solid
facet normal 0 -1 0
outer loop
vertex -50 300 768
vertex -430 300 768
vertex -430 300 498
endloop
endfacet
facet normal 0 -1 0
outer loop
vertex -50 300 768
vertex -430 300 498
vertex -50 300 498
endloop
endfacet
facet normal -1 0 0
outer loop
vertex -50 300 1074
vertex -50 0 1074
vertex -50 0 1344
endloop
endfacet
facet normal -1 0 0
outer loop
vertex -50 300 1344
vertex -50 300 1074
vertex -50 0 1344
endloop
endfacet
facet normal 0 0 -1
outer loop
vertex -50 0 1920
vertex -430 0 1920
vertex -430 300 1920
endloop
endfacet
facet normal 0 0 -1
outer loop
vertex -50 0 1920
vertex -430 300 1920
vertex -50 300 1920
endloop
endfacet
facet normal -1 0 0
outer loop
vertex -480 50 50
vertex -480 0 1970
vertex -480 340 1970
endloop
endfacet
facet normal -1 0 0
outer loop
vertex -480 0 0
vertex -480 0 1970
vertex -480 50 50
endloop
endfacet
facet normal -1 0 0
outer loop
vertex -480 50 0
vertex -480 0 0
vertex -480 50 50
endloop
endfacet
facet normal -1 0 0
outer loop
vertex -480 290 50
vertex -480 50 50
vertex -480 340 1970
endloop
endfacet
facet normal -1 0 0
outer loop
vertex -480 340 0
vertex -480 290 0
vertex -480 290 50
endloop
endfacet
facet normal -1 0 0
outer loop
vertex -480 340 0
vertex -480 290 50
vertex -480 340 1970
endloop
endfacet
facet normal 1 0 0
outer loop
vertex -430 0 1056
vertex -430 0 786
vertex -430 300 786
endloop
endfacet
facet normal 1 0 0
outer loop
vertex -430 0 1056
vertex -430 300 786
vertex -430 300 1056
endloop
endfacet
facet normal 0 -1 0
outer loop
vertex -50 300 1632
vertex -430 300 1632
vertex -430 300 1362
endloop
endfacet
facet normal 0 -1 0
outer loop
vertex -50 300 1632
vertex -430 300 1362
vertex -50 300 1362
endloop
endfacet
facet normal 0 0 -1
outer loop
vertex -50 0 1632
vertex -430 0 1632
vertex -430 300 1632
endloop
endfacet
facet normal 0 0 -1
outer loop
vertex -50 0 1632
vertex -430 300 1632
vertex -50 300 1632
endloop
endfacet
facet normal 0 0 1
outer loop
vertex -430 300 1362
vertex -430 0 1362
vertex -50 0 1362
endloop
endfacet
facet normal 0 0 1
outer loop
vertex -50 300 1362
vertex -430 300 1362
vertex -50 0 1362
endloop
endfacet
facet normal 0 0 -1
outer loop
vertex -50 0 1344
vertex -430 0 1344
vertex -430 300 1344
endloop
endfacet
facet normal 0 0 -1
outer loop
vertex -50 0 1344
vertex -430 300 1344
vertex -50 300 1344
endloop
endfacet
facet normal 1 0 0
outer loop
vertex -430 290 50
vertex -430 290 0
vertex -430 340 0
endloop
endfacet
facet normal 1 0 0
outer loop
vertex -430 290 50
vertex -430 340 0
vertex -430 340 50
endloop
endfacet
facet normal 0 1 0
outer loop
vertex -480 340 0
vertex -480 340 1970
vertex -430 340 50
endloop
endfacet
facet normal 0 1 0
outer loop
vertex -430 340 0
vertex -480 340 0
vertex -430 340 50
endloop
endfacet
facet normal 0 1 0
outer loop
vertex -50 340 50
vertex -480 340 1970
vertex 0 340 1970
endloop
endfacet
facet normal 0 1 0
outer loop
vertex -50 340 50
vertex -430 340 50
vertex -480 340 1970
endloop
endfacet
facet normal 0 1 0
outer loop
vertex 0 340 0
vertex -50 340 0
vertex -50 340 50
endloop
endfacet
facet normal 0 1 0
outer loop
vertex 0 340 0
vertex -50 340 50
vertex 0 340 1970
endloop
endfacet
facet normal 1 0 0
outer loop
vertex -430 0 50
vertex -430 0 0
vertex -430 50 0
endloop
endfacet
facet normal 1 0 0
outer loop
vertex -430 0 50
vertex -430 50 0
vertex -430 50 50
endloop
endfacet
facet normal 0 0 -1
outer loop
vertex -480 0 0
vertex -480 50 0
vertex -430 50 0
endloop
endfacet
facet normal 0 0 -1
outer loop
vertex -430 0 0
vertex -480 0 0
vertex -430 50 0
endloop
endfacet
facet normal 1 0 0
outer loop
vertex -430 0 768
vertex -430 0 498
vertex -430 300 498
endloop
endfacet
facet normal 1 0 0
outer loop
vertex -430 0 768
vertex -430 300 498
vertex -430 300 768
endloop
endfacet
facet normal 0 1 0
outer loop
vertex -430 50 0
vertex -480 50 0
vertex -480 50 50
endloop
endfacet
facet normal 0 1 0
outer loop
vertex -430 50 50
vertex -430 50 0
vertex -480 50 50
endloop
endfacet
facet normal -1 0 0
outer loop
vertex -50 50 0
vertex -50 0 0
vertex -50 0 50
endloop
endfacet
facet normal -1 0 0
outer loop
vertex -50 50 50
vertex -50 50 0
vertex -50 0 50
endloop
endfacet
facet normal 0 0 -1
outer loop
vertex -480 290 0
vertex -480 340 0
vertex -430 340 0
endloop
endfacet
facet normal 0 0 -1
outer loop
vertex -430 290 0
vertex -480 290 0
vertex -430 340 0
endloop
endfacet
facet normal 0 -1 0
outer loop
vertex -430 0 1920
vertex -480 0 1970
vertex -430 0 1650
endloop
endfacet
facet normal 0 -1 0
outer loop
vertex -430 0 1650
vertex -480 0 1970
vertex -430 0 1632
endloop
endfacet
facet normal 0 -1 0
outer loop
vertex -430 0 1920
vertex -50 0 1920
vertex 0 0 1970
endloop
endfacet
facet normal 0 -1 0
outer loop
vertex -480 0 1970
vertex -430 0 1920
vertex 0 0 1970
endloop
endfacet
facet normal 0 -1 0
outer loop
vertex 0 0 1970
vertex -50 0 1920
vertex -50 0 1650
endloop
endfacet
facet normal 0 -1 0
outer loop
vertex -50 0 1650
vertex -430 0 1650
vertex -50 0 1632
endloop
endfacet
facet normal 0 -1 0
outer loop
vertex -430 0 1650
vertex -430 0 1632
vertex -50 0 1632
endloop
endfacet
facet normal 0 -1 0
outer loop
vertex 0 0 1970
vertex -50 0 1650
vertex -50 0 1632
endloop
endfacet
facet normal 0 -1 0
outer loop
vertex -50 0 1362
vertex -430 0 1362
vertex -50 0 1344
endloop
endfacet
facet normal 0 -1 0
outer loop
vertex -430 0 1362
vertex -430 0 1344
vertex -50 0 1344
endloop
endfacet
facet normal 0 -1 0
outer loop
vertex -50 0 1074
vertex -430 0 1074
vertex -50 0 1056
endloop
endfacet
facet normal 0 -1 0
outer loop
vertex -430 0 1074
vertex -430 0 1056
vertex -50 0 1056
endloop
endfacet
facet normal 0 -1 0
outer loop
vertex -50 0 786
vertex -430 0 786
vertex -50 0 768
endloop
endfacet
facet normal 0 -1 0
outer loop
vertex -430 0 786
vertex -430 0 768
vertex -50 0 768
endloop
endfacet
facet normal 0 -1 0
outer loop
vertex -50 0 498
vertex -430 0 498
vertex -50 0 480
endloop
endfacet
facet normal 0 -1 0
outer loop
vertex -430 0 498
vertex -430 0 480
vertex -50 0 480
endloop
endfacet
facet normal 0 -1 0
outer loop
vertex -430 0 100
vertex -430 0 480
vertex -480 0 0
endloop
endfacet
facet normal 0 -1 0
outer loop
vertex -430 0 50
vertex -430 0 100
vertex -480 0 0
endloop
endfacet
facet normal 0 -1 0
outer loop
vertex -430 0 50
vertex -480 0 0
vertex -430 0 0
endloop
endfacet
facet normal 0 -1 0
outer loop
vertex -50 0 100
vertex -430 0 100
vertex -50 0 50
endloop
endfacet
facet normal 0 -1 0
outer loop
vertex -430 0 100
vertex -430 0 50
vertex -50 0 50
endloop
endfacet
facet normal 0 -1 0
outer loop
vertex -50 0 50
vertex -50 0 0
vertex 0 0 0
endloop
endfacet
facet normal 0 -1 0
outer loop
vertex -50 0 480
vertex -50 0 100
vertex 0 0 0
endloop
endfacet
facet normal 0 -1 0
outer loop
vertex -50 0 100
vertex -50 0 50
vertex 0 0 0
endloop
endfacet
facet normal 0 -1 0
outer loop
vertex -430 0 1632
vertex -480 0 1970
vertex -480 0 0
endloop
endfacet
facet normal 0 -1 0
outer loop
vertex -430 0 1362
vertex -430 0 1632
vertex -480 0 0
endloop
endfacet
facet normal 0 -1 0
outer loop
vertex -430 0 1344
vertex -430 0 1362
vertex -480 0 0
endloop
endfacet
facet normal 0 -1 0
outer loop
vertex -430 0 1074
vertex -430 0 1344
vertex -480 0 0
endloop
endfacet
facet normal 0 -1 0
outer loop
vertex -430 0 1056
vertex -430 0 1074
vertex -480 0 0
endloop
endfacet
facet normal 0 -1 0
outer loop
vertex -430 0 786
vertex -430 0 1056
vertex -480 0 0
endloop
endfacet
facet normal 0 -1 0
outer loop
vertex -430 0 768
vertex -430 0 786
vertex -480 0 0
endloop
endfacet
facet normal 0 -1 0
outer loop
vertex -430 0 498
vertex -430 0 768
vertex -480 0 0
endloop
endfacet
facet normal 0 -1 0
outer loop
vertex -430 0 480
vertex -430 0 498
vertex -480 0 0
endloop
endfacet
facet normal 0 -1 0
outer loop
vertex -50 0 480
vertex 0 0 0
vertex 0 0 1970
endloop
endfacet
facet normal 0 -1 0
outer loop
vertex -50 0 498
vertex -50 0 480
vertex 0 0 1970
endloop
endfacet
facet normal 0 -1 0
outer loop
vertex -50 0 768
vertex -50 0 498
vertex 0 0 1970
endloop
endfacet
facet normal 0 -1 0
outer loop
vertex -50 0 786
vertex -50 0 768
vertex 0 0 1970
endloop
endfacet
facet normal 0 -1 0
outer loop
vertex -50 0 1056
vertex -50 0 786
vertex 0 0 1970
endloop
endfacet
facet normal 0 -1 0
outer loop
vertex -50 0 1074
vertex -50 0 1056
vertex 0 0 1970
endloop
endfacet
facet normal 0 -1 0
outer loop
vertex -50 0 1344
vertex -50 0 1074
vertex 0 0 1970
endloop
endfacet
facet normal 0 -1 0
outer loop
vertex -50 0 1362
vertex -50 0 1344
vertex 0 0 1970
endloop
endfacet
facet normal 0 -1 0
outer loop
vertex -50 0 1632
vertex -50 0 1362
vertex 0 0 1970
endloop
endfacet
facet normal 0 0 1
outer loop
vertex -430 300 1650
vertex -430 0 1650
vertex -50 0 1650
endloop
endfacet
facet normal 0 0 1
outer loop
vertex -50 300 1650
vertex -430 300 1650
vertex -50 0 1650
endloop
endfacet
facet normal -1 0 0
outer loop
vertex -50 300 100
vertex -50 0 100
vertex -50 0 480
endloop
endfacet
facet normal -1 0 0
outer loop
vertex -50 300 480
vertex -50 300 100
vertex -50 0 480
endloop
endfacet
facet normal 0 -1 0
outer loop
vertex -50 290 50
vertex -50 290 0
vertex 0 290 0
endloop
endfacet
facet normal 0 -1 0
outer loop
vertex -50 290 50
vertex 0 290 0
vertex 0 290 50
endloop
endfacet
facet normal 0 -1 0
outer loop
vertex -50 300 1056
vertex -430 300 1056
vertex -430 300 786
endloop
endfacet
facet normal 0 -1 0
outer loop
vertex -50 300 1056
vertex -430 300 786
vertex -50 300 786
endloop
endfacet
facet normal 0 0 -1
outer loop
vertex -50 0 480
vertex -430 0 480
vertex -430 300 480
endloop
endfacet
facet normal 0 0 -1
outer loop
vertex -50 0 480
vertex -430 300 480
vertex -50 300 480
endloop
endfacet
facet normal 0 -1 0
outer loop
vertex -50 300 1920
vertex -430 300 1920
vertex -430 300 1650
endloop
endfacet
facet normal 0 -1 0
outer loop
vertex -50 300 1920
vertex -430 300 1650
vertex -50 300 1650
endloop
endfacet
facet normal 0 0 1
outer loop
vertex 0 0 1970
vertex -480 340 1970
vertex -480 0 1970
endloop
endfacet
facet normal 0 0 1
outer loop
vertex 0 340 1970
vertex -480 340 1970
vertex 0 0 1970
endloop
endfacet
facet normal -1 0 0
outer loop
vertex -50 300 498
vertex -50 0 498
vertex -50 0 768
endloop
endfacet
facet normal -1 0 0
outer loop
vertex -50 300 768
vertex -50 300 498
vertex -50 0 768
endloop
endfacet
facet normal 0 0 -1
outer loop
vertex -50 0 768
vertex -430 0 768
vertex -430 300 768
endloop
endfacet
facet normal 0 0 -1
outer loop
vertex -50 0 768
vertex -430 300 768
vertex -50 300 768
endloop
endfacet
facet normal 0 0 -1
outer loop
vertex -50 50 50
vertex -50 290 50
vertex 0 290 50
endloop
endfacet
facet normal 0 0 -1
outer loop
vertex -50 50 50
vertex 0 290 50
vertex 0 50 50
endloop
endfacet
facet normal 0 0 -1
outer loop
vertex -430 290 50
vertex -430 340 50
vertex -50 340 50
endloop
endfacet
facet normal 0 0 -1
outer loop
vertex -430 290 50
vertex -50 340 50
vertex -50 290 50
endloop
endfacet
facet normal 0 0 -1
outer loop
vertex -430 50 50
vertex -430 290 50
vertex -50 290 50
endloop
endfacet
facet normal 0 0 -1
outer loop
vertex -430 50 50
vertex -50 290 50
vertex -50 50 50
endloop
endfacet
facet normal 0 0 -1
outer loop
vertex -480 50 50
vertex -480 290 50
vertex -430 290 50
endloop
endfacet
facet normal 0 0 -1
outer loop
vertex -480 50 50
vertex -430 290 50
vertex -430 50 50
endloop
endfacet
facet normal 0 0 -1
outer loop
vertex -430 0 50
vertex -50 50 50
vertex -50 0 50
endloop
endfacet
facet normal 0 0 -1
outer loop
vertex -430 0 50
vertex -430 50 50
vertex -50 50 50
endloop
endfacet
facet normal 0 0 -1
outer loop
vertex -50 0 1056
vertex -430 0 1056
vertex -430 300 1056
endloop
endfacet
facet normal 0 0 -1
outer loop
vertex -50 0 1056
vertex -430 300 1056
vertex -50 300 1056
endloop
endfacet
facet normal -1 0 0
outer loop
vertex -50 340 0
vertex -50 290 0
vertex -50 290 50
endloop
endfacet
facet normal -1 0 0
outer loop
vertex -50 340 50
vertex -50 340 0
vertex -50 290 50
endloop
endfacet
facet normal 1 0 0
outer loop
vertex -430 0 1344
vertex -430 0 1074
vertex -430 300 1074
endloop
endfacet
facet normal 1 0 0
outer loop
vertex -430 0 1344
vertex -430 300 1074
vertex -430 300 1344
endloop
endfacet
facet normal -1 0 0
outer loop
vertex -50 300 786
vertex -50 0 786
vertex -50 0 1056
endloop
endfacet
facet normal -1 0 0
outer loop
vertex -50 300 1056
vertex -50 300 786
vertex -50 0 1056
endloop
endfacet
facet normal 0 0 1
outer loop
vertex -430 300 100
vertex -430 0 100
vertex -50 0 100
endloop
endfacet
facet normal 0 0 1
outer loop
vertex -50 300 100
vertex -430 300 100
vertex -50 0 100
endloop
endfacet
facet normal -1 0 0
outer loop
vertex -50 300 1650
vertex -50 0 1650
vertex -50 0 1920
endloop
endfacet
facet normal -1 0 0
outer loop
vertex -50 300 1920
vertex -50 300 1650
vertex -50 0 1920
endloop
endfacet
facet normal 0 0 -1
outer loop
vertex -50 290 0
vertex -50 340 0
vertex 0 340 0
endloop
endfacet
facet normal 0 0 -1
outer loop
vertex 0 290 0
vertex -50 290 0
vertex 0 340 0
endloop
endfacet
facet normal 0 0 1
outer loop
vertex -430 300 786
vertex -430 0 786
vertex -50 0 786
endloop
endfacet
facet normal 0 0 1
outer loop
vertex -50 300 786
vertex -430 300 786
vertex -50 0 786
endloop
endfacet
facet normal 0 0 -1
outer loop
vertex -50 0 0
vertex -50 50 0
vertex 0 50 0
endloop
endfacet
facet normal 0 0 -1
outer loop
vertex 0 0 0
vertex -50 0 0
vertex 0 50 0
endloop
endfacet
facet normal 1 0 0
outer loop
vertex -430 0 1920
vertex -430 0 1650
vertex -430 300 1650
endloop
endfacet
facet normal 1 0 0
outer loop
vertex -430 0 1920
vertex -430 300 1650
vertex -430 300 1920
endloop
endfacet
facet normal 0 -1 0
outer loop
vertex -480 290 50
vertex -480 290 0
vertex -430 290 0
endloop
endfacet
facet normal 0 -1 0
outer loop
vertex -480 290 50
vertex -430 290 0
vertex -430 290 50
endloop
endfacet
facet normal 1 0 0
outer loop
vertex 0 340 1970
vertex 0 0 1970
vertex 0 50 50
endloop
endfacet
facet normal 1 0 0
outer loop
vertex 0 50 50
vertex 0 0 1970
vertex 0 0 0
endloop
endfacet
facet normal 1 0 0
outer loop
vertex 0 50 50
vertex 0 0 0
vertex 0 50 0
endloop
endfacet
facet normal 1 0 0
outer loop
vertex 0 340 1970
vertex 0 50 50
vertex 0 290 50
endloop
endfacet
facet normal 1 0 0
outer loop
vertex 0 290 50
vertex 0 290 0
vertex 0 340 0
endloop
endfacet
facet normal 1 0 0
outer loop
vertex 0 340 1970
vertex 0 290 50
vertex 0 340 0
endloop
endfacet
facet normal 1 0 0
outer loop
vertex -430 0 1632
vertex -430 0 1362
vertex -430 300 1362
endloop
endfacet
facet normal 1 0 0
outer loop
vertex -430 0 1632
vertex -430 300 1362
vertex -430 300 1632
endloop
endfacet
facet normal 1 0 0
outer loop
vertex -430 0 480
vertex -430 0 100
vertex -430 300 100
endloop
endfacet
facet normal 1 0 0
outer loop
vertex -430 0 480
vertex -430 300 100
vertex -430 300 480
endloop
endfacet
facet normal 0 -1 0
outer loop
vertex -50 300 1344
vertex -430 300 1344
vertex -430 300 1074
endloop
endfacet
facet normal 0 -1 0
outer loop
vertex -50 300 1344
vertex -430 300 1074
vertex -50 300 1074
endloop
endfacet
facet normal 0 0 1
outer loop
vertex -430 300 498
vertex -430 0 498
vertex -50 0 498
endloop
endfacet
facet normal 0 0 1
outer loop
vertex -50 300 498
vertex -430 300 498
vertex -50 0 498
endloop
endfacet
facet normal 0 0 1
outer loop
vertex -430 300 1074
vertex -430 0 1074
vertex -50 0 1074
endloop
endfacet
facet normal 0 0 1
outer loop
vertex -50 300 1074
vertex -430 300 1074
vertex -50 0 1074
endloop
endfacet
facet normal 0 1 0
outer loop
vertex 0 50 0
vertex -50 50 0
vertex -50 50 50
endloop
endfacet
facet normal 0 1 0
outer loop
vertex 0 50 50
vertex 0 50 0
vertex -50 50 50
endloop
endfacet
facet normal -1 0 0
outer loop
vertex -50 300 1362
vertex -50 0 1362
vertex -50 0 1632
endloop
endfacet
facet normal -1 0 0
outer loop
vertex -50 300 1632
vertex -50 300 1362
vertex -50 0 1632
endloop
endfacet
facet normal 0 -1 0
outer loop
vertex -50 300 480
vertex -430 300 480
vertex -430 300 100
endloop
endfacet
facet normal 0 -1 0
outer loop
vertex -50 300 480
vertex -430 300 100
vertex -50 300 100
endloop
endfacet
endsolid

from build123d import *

# Parameters (mm, degrees)
F0_W     = 480
F0_H     = 340
F1_DEPTH = 1970
F2_W     = 380
F2_H     = 50
F3_DEPTH = 350
F2_H_2   = 380
F2_H_3   = 270
F4_DEPTH = 300
F5_W     = 240
F5_H     = 50
F6_DEPTH = 895


with BuildPart() as f1:
    # F0 (on Top) → F1 (new body)
    with BuildSketch(Plane.XY):
        with Locations((-240, 170)):
            Rectangle(F0_W, F0_H)
    extrude(amount=F1_DEPTH)

    # F2 (on face) → F3 (cut)
    with BuildSketch(Plane.XZ):
        with Locations((-240, 25)):
            Rectangle(F2_W, F2_H)
    extrude(amount=-F3_DEPTH, mode=Mode.SUBTRACT)

    # F2 (on face) → F4 (cut)
    with BuildSketch(Plane.XZ):
        with Locations((-240, 290)):
            Rectangle(F2_W, F2_H_2)
        with Locations((-240, 633)):
            Rectangle(F2_W, F2_H_3)
        with Locations((-240, 921)):
            Rectangle(F2_W, F2_H_3)
        with Locations((-240, 1209)):
            Rectangle(F2_W, F2_H_3)
        with Locations((-240, 1497)):
            Rectangle(F2_W, F2_H_3)
        with Locations((-240, 1785)):
            Rectangle(F2_W, F2_H_3)
    extrude(amount=-F4_DEPTH, mode=Mode.SUBTRACT)

    # F5 (on face) → F6 (cut)
    with BuildSketch(Plane(origin=(-480, 0, 0), x_dir=(0, -1, 0), z_dir=(-1, 0, 0))):
        with Locations((-170, 25)):
            Rectangle(F5_W, F5_H)
    extrude(amount=-F6_DEPTH, mode=Mode.SUBTRACT)


solid = f1.part
